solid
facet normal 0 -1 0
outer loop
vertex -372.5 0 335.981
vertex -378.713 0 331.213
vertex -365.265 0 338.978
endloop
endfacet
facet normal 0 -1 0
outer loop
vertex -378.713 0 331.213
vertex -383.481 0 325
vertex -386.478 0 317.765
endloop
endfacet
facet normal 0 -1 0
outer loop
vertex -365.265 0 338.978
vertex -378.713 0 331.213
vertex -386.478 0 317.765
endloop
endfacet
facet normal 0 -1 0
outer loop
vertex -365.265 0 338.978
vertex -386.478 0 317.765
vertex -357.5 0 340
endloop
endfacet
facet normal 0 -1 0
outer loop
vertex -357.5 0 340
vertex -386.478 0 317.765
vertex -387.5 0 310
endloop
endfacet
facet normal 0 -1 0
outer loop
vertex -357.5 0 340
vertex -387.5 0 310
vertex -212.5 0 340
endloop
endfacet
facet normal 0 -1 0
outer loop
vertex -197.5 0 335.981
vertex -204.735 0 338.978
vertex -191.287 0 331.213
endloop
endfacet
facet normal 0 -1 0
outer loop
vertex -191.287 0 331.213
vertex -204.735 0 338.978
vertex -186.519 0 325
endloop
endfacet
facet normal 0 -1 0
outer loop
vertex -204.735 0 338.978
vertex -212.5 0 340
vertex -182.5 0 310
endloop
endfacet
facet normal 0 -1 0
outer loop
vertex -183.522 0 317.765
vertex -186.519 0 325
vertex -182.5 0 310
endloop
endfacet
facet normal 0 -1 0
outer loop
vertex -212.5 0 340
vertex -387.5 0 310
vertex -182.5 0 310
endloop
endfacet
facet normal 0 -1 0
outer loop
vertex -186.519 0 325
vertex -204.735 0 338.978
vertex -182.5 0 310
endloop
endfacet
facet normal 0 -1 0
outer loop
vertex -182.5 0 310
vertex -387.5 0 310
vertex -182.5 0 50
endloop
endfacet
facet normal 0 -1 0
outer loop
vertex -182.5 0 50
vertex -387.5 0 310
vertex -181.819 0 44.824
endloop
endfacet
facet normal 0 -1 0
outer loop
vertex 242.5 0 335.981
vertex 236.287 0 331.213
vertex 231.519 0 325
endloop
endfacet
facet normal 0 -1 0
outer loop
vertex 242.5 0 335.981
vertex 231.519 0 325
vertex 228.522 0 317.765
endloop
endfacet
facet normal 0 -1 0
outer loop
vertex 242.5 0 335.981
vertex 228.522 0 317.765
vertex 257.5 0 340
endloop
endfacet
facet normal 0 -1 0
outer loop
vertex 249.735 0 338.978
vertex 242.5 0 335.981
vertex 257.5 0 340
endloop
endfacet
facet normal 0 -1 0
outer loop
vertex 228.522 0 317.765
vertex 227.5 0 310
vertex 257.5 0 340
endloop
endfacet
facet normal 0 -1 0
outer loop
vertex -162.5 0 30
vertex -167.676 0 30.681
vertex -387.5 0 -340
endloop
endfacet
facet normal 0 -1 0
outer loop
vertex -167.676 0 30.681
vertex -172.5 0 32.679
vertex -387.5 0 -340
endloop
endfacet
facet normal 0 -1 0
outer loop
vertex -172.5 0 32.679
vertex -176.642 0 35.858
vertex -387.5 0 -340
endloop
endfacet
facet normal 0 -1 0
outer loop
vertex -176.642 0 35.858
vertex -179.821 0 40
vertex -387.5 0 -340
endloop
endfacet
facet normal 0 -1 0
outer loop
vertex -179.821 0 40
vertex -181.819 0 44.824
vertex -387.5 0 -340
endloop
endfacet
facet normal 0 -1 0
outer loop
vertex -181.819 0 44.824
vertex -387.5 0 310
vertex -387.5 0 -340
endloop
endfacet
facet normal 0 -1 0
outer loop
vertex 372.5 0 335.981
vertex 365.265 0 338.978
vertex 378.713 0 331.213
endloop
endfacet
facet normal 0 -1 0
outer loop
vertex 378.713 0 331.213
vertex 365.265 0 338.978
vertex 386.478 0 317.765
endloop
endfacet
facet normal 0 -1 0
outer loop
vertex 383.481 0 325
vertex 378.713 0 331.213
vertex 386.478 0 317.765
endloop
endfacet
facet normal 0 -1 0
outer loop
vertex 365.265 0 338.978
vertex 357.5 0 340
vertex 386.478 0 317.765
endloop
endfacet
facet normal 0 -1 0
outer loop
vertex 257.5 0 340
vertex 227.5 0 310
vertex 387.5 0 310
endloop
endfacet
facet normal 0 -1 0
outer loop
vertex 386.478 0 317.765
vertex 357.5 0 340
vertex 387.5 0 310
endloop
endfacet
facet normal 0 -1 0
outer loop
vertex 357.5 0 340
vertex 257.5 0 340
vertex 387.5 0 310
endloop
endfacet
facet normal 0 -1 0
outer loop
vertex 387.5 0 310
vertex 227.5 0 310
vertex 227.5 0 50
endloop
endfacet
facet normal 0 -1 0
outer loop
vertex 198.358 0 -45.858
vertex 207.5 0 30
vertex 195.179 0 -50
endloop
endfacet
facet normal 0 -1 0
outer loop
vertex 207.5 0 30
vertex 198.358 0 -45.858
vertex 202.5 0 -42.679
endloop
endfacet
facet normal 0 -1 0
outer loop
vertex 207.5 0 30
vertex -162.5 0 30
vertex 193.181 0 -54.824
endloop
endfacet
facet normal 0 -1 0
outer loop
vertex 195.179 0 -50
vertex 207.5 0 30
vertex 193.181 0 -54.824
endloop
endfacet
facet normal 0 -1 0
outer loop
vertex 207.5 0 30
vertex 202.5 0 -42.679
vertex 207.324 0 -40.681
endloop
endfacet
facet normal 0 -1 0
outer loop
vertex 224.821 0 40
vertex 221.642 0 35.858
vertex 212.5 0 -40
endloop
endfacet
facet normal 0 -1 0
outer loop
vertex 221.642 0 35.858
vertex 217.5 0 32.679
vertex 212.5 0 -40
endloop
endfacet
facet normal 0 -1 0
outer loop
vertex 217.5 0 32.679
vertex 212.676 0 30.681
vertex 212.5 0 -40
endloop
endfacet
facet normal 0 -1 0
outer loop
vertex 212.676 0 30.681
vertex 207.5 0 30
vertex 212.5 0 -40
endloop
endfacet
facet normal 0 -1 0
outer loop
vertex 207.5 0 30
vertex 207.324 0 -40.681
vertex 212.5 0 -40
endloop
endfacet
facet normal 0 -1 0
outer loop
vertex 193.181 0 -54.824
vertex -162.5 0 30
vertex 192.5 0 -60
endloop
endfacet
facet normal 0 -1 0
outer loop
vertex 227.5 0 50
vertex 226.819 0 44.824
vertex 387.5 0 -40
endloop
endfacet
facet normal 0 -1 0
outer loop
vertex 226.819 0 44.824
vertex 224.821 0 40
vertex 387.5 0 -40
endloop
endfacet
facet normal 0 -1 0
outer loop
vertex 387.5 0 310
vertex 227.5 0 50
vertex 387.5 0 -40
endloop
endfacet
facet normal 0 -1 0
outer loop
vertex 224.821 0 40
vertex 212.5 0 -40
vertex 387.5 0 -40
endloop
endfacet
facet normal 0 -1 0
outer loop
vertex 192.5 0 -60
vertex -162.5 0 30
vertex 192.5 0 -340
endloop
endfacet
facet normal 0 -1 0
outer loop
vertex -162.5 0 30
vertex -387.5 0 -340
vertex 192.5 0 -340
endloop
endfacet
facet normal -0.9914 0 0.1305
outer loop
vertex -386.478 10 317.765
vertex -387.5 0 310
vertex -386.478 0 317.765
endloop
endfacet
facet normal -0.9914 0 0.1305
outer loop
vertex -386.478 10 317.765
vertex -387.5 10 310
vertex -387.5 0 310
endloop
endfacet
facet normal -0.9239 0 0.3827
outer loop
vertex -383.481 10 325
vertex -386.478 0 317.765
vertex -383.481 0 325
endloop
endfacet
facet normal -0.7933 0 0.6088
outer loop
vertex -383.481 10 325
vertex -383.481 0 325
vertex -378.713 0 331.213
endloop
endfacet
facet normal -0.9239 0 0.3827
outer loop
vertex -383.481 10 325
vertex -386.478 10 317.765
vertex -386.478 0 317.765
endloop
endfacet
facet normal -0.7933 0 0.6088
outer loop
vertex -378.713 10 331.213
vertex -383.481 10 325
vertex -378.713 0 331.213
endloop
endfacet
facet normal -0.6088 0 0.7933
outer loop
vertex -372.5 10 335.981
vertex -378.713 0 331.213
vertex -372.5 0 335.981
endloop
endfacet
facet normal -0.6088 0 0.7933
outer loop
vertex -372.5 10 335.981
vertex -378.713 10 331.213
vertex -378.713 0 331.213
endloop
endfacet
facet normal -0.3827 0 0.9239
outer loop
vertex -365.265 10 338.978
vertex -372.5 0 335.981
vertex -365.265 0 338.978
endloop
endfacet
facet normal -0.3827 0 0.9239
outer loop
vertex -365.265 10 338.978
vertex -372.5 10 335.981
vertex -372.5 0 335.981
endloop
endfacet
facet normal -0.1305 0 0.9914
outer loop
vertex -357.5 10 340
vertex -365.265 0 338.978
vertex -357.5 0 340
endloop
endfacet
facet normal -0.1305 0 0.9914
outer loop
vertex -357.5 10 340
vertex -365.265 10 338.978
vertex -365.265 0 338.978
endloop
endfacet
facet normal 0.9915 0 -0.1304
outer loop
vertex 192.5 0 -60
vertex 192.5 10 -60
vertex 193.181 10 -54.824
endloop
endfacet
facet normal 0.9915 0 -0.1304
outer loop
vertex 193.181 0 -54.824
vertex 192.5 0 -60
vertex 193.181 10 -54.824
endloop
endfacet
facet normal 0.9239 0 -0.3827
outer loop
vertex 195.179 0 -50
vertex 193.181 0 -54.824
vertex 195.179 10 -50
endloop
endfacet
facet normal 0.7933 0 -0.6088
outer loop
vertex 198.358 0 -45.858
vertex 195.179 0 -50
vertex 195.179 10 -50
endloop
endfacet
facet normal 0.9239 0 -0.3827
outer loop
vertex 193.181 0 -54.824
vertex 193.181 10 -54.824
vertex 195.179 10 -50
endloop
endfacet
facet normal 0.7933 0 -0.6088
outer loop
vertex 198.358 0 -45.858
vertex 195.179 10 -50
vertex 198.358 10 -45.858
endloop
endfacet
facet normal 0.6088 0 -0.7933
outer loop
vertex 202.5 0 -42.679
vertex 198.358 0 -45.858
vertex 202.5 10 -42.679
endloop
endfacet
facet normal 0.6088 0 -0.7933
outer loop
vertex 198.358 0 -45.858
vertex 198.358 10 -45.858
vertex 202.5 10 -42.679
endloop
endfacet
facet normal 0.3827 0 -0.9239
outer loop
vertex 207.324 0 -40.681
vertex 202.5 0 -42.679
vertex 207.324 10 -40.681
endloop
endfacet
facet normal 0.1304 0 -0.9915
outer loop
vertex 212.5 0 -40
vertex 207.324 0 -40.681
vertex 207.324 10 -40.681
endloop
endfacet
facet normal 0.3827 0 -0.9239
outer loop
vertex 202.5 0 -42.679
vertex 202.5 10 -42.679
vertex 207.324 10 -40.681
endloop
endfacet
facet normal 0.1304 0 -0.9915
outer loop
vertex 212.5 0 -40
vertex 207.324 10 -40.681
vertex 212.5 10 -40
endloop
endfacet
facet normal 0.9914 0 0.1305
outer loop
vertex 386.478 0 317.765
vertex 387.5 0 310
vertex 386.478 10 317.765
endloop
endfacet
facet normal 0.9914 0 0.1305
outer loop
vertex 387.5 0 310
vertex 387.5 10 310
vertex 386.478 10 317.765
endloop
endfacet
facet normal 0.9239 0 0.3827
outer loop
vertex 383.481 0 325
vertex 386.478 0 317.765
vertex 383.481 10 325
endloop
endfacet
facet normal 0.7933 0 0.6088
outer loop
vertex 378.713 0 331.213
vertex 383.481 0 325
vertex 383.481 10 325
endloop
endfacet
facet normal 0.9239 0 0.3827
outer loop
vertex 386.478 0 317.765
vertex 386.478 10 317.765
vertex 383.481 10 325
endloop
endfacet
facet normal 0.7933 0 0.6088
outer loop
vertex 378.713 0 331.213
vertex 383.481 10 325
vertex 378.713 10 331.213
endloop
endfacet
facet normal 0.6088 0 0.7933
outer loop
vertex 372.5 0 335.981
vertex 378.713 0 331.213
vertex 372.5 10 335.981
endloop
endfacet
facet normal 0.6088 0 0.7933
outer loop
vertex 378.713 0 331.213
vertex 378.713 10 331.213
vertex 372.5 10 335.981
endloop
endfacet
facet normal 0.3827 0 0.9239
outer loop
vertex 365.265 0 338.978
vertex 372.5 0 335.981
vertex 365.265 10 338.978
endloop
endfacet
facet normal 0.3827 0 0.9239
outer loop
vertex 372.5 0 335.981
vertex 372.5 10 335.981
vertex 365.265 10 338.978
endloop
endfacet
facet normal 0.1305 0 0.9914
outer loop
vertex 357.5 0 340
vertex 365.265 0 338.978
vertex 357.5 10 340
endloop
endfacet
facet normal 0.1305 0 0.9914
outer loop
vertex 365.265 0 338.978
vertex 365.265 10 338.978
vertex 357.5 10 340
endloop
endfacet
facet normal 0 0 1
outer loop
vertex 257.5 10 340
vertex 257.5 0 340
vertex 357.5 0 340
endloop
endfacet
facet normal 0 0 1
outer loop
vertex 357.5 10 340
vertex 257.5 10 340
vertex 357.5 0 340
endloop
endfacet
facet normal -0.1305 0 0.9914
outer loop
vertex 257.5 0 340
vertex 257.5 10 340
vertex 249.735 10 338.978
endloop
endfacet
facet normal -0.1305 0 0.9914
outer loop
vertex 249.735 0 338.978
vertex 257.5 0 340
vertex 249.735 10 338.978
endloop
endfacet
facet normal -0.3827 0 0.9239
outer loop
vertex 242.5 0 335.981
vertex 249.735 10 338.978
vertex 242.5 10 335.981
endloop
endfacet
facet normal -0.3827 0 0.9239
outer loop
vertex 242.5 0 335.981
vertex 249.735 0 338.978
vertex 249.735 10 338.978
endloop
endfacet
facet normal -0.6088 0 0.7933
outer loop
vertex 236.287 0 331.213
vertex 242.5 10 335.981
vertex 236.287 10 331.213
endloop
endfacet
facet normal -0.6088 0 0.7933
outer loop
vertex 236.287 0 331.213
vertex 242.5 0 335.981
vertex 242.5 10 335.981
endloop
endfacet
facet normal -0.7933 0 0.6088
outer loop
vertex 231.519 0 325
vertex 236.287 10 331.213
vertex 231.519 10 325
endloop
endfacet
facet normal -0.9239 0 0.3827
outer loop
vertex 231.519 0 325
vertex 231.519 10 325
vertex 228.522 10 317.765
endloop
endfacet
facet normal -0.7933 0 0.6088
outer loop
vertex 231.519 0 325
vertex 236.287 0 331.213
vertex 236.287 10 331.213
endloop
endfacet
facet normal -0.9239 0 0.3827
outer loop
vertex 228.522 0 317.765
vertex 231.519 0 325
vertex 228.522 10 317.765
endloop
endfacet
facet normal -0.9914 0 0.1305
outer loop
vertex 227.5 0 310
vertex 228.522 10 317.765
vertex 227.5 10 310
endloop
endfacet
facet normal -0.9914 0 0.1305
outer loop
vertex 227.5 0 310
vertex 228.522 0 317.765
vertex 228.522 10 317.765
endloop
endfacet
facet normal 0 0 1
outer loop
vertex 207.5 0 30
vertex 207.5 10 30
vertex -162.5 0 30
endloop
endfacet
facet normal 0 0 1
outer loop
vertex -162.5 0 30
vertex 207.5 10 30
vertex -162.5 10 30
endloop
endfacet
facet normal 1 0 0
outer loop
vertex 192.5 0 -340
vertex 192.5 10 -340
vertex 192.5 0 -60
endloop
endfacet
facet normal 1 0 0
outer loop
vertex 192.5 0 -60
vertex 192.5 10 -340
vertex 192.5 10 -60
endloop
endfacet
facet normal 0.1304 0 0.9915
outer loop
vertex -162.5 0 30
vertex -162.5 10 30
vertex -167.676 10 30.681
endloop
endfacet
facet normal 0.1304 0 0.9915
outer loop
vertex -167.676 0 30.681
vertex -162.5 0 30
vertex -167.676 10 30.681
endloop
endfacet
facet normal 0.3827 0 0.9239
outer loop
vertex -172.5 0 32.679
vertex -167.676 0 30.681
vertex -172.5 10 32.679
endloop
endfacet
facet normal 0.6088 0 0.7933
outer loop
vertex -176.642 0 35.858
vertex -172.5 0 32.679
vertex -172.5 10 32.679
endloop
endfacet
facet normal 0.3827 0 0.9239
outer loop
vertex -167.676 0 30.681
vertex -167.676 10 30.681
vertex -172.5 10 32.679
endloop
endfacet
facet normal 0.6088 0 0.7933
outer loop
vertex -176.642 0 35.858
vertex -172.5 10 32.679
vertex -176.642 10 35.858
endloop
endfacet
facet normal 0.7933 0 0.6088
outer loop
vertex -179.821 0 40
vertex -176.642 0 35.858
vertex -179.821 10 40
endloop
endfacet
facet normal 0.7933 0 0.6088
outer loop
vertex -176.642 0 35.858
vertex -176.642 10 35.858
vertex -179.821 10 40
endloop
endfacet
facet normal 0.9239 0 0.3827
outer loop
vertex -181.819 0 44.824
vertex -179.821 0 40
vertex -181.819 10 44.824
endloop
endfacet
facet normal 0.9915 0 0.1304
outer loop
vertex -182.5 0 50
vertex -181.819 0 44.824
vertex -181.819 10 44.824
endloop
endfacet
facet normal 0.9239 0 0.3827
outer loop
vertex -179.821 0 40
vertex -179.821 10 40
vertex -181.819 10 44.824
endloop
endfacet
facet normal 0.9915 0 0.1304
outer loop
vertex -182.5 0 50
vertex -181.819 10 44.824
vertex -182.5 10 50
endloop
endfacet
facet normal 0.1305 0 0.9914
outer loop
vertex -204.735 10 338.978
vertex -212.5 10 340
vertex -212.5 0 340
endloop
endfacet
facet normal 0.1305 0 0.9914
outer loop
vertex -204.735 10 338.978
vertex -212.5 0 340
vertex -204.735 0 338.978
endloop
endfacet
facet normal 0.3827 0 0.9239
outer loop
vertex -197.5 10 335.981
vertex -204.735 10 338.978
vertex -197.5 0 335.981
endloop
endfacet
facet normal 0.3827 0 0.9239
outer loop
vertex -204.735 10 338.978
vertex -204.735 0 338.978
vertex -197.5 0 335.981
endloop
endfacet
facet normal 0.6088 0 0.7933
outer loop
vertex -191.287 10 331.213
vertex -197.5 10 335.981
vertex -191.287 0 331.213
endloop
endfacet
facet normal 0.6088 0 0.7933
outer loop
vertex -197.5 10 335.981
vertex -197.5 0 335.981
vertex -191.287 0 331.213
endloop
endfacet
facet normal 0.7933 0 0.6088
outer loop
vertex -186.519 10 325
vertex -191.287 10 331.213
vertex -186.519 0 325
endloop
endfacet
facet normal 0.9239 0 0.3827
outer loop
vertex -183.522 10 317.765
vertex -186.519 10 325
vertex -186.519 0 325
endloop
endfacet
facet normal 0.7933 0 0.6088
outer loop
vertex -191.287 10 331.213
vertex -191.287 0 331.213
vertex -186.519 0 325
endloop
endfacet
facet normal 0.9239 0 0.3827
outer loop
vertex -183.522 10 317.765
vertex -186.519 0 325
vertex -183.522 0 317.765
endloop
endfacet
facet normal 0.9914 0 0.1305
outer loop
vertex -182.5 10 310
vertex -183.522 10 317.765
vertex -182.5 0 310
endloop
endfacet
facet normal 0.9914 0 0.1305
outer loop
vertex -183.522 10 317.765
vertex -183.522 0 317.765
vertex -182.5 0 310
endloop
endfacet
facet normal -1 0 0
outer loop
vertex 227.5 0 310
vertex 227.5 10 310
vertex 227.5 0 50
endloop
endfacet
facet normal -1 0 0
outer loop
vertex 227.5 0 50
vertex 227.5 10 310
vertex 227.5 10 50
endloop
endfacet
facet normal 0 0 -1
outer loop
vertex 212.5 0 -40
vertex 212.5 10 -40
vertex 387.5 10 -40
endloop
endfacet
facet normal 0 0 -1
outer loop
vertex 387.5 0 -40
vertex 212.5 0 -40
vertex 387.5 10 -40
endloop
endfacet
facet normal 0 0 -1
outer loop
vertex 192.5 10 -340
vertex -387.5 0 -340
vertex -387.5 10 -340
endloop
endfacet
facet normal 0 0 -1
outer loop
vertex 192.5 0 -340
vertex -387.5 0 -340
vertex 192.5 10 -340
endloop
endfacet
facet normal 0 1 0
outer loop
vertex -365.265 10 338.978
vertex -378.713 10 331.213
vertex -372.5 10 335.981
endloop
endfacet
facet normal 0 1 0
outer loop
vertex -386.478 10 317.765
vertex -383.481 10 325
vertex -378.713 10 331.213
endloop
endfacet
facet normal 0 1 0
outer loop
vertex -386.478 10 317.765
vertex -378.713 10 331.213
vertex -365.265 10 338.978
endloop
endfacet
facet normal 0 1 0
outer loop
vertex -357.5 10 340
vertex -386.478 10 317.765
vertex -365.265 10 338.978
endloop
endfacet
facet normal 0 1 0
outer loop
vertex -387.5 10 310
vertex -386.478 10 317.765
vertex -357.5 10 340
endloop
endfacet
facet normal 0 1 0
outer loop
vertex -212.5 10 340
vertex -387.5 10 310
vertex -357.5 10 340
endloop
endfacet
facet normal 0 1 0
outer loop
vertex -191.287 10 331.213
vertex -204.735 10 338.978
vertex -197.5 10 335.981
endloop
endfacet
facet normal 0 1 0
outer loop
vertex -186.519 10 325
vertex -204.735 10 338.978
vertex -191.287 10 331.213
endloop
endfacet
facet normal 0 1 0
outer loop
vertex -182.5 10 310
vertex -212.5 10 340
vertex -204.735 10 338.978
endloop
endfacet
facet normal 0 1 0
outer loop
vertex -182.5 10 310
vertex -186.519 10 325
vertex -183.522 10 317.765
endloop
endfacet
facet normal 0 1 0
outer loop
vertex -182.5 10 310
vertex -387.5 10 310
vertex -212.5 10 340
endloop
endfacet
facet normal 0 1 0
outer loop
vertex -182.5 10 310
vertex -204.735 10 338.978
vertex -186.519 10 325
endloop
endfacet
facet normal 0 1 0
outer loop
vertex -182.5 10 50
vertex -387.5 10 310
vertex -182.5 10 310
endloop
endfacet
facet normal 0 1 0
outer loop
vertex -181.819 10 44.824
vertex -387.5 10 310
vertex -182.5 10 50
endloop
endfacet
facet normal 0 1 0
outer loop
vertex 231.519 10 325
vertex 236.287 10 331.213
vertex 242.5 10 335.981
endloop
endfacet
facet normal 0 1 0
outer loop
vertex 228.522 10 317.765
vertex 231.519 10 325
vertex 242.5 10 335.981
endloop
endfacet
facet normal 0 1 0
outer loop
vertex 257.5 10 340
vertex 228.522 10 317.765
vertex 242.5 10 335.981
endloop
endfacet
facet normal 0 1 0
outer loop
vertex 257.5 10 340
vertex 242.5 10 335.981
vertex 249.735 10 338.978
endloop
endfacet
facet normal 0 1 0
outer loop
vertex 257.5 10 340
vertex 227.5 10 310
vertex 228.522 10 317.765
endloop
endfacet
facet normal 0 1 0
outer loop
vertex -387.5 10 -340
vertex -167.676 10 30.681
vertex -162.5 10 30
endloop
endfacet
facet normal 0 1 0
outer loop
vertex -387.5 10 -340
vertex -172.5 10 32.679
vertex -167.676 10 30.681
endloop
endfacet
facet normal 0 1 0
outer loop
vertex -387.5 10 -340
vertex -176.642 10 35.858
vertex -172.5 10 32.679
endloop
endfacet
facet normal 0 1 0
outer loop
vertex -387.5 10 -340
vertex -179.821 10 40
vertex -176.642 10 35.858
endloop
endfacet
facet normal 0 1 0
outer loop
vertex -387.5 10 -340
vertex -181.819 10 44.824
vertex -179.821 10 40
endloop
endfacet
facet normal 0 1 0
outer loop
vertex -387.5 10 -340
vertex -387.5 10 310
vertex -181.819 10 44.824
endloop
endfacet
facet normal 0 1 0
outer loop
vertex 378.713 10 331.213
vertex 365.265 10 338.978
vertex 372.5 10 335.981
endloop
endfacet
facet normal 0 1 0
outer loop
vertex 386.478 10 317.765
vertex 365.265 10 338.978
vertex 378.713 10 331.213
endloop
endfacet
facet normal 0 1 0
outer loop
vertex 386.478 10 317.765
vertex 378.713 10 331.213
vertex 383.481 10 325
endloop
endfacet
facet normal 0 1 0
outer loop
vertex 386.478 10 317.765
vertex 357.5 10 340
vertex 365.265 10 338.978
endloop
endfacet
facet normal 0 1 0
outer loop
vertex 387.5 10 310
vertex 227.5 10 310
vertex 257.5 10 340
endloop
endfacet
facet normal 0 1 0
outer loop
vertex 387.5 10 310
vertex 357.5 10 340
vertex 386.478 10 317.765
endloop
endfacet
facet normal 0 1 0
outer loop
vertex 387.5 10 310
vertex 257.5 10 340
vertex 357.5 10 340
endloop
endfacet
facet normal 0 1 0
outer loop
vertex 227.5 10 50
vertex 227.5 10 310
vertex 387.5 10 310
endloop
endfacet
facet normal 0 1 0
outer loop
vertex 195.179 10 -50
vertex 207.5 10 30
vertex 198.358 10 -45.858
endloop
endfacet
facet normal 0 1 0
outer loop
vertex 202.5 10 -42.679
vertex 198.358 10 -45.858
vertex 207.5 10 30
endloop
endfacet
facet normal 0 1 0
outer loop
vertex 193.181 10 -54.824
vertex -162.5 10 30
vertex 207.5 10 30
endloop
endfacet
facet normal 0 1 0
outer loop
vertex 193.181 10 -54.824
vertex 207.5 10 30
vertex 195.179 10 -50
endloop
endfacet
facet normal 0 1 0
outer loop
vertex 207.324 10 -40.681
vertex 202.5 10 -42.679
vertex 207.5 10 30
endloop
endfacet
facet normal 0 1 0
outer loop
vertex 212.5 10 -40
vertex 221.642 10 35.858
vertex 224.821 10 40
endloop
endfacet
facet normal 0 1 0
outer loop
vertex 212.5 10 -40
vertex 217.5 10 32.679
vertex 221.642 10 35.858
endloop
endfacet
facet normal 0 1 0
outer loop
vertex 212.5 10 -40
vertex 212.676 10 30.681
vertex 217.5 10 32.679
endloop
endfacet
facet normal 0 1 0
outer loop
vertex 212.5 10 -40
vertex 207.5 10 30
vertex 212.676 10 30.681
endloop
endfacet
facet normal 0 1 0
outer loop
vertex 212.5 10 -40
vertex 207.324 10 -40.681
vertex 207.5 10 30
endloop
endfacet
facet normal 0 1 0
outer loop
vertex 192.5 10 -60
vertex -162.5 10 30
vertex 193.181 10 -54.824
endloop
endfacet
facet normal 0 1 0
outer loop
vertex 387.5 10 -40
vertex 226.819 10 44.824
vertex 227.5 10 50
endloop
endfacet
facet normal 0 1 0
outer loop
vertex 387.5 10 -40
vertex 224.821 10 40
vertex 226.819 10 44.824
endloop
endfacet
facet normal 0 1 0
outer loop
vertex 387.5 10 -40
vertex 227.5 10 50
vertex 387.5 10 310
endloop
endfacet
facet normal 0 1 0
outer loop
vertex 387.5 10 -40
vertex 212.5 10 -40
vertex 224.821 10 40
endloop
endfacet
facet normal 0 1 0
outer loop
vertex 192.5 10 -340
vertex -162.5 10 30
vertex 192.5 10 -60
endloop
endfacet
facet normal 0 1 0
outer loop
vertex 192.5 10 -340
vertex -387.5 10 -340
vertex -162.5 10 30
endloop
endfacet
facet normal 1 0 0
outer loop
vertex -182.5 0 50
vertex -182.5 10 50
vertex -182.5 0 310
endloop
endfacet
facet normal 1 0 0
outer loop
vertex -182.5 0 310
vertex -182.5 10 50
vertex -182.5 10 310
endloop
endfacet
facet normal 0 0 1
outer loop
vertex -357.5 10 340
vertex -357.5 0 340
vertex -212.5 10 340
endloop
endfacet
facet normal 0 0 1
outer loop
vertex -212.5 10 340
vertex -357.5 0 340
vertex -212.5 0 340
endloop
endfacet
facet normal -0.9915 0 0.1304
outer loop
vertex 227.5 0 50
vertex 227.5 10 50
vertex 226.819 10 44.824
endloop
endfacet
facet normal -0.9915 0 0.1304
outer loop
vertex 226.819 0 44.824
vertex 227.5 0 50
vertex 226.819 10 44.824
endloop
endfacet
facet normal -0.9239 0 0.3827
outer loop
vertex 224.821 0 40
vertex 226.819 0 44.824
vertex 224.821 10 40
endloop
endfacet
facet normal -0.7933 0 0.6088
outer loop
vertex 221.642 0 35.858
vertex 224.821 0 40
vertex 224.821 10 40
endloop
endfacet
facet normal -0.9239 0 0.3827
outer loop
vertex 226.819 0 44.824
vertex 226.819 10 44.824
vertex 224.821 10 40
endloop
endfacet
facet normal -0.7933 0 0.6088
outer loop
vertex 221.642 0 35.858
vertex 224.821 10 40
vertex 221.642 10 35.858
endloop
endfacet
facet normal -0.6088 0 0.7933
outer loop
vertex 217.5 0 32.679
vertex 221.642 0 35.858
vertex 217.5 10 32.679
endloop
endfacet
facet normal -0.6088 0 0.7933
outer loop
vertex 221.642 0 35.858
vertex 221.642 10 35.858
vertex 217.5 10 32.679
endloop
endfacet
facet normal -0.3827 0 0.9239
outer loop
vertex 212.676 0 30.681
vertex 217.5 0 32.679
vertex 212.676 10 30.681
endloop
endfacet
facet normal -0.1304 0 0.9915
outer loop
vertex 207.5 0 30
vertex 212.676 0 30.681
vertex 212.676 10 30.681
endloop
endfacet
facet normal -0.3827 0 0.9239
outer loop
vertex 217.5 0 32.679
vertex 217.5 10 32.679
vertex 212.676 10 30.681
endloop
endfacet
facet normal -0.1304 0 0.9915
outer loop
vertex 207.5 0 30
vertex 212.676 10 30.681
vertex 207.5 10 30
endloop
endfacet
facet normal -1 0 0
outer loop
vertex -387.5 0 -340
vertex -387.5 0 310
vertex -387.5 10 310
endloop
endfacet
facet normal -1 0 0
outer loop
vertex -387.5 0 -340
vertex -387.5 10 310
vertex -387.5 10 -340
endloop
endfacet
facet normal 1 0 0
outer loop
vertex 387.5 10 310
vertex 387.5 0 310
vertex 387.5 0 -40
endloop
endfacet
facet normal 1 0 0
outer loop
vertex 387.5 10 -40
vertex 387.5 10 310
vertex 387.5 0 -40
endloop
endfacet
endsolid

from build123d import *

# Parameters (mm, degrees)
ESBO_O1_W                = 775
ESBO_O1_H                = 680
RESSALTO_EXTRUS_O1_DEPTH = 10
CORTE_EXTRUS_O1_DEPTH    = 516.612499848
FILETE1_R                = 30


with BuildPart() as part:
    # Esboço1 → Ressalto-extrusão1 (new body)
    with BuildSketch(Plane(origin=(0, 0, 0), x_dir=(1, 0, 0), z_dir=(0, 1, 0))):
        Rectangle(ESBO_O1_W, ESBO_O1_H)
    extrude(amount=RESSALTO_EXTRUS_O1_DEPTH)

    # Esboço2 → Corte-extrusão1 (cut, through all)
    with BuildSketch(Plane(origin=(0, 10, 0), x_dir=(1, 0, 0), z_dir=(0, 1, 0))):
        with BuildLine():
            Line((387.5, 340), (192.5, 340))
            Line((192.5, 340), (192.5, 60))
            ThreePointArc((192.5, 60), (198.357864376, 45.857864376), (212.5, 40))
            Line((212.5, 40), (387.5, 40))
            Line((387.5, 40), (387.5, 340))
        make_face()
        with BuildLine():
            Line((-182.5, -340), (227.5, -340))
            Line((227.5, -340), (227.5, -50))
            ThreePointArc((227.5, -50), (221.642135624, -35.857864376), (207.5, -30))
            Line((207.5, -30), (-162.5, -30))
            ThreePointArc((-162.5, -30), (-176.642135624, -35.857864376), (-182.5, -50))
            Line((-182.5, -50), (-182.5, -340))
        make_face()
    extrude(amount=-CORTE_EXTRUS_O1_DEPTH, mode=Mode.SUBTRACT)

    # Filete1
    filete1_edges = [part.edges().sort_by_distance(p)[0] for p in [
        (-182.5, 5, 340),
        (227.5, 5, 340),
        (387.5, 5, 340),
        (-387.5, 5, 340),
    ]]
    fillet(filete1_edges, radius=FILETE1_R)


solid = part.part
